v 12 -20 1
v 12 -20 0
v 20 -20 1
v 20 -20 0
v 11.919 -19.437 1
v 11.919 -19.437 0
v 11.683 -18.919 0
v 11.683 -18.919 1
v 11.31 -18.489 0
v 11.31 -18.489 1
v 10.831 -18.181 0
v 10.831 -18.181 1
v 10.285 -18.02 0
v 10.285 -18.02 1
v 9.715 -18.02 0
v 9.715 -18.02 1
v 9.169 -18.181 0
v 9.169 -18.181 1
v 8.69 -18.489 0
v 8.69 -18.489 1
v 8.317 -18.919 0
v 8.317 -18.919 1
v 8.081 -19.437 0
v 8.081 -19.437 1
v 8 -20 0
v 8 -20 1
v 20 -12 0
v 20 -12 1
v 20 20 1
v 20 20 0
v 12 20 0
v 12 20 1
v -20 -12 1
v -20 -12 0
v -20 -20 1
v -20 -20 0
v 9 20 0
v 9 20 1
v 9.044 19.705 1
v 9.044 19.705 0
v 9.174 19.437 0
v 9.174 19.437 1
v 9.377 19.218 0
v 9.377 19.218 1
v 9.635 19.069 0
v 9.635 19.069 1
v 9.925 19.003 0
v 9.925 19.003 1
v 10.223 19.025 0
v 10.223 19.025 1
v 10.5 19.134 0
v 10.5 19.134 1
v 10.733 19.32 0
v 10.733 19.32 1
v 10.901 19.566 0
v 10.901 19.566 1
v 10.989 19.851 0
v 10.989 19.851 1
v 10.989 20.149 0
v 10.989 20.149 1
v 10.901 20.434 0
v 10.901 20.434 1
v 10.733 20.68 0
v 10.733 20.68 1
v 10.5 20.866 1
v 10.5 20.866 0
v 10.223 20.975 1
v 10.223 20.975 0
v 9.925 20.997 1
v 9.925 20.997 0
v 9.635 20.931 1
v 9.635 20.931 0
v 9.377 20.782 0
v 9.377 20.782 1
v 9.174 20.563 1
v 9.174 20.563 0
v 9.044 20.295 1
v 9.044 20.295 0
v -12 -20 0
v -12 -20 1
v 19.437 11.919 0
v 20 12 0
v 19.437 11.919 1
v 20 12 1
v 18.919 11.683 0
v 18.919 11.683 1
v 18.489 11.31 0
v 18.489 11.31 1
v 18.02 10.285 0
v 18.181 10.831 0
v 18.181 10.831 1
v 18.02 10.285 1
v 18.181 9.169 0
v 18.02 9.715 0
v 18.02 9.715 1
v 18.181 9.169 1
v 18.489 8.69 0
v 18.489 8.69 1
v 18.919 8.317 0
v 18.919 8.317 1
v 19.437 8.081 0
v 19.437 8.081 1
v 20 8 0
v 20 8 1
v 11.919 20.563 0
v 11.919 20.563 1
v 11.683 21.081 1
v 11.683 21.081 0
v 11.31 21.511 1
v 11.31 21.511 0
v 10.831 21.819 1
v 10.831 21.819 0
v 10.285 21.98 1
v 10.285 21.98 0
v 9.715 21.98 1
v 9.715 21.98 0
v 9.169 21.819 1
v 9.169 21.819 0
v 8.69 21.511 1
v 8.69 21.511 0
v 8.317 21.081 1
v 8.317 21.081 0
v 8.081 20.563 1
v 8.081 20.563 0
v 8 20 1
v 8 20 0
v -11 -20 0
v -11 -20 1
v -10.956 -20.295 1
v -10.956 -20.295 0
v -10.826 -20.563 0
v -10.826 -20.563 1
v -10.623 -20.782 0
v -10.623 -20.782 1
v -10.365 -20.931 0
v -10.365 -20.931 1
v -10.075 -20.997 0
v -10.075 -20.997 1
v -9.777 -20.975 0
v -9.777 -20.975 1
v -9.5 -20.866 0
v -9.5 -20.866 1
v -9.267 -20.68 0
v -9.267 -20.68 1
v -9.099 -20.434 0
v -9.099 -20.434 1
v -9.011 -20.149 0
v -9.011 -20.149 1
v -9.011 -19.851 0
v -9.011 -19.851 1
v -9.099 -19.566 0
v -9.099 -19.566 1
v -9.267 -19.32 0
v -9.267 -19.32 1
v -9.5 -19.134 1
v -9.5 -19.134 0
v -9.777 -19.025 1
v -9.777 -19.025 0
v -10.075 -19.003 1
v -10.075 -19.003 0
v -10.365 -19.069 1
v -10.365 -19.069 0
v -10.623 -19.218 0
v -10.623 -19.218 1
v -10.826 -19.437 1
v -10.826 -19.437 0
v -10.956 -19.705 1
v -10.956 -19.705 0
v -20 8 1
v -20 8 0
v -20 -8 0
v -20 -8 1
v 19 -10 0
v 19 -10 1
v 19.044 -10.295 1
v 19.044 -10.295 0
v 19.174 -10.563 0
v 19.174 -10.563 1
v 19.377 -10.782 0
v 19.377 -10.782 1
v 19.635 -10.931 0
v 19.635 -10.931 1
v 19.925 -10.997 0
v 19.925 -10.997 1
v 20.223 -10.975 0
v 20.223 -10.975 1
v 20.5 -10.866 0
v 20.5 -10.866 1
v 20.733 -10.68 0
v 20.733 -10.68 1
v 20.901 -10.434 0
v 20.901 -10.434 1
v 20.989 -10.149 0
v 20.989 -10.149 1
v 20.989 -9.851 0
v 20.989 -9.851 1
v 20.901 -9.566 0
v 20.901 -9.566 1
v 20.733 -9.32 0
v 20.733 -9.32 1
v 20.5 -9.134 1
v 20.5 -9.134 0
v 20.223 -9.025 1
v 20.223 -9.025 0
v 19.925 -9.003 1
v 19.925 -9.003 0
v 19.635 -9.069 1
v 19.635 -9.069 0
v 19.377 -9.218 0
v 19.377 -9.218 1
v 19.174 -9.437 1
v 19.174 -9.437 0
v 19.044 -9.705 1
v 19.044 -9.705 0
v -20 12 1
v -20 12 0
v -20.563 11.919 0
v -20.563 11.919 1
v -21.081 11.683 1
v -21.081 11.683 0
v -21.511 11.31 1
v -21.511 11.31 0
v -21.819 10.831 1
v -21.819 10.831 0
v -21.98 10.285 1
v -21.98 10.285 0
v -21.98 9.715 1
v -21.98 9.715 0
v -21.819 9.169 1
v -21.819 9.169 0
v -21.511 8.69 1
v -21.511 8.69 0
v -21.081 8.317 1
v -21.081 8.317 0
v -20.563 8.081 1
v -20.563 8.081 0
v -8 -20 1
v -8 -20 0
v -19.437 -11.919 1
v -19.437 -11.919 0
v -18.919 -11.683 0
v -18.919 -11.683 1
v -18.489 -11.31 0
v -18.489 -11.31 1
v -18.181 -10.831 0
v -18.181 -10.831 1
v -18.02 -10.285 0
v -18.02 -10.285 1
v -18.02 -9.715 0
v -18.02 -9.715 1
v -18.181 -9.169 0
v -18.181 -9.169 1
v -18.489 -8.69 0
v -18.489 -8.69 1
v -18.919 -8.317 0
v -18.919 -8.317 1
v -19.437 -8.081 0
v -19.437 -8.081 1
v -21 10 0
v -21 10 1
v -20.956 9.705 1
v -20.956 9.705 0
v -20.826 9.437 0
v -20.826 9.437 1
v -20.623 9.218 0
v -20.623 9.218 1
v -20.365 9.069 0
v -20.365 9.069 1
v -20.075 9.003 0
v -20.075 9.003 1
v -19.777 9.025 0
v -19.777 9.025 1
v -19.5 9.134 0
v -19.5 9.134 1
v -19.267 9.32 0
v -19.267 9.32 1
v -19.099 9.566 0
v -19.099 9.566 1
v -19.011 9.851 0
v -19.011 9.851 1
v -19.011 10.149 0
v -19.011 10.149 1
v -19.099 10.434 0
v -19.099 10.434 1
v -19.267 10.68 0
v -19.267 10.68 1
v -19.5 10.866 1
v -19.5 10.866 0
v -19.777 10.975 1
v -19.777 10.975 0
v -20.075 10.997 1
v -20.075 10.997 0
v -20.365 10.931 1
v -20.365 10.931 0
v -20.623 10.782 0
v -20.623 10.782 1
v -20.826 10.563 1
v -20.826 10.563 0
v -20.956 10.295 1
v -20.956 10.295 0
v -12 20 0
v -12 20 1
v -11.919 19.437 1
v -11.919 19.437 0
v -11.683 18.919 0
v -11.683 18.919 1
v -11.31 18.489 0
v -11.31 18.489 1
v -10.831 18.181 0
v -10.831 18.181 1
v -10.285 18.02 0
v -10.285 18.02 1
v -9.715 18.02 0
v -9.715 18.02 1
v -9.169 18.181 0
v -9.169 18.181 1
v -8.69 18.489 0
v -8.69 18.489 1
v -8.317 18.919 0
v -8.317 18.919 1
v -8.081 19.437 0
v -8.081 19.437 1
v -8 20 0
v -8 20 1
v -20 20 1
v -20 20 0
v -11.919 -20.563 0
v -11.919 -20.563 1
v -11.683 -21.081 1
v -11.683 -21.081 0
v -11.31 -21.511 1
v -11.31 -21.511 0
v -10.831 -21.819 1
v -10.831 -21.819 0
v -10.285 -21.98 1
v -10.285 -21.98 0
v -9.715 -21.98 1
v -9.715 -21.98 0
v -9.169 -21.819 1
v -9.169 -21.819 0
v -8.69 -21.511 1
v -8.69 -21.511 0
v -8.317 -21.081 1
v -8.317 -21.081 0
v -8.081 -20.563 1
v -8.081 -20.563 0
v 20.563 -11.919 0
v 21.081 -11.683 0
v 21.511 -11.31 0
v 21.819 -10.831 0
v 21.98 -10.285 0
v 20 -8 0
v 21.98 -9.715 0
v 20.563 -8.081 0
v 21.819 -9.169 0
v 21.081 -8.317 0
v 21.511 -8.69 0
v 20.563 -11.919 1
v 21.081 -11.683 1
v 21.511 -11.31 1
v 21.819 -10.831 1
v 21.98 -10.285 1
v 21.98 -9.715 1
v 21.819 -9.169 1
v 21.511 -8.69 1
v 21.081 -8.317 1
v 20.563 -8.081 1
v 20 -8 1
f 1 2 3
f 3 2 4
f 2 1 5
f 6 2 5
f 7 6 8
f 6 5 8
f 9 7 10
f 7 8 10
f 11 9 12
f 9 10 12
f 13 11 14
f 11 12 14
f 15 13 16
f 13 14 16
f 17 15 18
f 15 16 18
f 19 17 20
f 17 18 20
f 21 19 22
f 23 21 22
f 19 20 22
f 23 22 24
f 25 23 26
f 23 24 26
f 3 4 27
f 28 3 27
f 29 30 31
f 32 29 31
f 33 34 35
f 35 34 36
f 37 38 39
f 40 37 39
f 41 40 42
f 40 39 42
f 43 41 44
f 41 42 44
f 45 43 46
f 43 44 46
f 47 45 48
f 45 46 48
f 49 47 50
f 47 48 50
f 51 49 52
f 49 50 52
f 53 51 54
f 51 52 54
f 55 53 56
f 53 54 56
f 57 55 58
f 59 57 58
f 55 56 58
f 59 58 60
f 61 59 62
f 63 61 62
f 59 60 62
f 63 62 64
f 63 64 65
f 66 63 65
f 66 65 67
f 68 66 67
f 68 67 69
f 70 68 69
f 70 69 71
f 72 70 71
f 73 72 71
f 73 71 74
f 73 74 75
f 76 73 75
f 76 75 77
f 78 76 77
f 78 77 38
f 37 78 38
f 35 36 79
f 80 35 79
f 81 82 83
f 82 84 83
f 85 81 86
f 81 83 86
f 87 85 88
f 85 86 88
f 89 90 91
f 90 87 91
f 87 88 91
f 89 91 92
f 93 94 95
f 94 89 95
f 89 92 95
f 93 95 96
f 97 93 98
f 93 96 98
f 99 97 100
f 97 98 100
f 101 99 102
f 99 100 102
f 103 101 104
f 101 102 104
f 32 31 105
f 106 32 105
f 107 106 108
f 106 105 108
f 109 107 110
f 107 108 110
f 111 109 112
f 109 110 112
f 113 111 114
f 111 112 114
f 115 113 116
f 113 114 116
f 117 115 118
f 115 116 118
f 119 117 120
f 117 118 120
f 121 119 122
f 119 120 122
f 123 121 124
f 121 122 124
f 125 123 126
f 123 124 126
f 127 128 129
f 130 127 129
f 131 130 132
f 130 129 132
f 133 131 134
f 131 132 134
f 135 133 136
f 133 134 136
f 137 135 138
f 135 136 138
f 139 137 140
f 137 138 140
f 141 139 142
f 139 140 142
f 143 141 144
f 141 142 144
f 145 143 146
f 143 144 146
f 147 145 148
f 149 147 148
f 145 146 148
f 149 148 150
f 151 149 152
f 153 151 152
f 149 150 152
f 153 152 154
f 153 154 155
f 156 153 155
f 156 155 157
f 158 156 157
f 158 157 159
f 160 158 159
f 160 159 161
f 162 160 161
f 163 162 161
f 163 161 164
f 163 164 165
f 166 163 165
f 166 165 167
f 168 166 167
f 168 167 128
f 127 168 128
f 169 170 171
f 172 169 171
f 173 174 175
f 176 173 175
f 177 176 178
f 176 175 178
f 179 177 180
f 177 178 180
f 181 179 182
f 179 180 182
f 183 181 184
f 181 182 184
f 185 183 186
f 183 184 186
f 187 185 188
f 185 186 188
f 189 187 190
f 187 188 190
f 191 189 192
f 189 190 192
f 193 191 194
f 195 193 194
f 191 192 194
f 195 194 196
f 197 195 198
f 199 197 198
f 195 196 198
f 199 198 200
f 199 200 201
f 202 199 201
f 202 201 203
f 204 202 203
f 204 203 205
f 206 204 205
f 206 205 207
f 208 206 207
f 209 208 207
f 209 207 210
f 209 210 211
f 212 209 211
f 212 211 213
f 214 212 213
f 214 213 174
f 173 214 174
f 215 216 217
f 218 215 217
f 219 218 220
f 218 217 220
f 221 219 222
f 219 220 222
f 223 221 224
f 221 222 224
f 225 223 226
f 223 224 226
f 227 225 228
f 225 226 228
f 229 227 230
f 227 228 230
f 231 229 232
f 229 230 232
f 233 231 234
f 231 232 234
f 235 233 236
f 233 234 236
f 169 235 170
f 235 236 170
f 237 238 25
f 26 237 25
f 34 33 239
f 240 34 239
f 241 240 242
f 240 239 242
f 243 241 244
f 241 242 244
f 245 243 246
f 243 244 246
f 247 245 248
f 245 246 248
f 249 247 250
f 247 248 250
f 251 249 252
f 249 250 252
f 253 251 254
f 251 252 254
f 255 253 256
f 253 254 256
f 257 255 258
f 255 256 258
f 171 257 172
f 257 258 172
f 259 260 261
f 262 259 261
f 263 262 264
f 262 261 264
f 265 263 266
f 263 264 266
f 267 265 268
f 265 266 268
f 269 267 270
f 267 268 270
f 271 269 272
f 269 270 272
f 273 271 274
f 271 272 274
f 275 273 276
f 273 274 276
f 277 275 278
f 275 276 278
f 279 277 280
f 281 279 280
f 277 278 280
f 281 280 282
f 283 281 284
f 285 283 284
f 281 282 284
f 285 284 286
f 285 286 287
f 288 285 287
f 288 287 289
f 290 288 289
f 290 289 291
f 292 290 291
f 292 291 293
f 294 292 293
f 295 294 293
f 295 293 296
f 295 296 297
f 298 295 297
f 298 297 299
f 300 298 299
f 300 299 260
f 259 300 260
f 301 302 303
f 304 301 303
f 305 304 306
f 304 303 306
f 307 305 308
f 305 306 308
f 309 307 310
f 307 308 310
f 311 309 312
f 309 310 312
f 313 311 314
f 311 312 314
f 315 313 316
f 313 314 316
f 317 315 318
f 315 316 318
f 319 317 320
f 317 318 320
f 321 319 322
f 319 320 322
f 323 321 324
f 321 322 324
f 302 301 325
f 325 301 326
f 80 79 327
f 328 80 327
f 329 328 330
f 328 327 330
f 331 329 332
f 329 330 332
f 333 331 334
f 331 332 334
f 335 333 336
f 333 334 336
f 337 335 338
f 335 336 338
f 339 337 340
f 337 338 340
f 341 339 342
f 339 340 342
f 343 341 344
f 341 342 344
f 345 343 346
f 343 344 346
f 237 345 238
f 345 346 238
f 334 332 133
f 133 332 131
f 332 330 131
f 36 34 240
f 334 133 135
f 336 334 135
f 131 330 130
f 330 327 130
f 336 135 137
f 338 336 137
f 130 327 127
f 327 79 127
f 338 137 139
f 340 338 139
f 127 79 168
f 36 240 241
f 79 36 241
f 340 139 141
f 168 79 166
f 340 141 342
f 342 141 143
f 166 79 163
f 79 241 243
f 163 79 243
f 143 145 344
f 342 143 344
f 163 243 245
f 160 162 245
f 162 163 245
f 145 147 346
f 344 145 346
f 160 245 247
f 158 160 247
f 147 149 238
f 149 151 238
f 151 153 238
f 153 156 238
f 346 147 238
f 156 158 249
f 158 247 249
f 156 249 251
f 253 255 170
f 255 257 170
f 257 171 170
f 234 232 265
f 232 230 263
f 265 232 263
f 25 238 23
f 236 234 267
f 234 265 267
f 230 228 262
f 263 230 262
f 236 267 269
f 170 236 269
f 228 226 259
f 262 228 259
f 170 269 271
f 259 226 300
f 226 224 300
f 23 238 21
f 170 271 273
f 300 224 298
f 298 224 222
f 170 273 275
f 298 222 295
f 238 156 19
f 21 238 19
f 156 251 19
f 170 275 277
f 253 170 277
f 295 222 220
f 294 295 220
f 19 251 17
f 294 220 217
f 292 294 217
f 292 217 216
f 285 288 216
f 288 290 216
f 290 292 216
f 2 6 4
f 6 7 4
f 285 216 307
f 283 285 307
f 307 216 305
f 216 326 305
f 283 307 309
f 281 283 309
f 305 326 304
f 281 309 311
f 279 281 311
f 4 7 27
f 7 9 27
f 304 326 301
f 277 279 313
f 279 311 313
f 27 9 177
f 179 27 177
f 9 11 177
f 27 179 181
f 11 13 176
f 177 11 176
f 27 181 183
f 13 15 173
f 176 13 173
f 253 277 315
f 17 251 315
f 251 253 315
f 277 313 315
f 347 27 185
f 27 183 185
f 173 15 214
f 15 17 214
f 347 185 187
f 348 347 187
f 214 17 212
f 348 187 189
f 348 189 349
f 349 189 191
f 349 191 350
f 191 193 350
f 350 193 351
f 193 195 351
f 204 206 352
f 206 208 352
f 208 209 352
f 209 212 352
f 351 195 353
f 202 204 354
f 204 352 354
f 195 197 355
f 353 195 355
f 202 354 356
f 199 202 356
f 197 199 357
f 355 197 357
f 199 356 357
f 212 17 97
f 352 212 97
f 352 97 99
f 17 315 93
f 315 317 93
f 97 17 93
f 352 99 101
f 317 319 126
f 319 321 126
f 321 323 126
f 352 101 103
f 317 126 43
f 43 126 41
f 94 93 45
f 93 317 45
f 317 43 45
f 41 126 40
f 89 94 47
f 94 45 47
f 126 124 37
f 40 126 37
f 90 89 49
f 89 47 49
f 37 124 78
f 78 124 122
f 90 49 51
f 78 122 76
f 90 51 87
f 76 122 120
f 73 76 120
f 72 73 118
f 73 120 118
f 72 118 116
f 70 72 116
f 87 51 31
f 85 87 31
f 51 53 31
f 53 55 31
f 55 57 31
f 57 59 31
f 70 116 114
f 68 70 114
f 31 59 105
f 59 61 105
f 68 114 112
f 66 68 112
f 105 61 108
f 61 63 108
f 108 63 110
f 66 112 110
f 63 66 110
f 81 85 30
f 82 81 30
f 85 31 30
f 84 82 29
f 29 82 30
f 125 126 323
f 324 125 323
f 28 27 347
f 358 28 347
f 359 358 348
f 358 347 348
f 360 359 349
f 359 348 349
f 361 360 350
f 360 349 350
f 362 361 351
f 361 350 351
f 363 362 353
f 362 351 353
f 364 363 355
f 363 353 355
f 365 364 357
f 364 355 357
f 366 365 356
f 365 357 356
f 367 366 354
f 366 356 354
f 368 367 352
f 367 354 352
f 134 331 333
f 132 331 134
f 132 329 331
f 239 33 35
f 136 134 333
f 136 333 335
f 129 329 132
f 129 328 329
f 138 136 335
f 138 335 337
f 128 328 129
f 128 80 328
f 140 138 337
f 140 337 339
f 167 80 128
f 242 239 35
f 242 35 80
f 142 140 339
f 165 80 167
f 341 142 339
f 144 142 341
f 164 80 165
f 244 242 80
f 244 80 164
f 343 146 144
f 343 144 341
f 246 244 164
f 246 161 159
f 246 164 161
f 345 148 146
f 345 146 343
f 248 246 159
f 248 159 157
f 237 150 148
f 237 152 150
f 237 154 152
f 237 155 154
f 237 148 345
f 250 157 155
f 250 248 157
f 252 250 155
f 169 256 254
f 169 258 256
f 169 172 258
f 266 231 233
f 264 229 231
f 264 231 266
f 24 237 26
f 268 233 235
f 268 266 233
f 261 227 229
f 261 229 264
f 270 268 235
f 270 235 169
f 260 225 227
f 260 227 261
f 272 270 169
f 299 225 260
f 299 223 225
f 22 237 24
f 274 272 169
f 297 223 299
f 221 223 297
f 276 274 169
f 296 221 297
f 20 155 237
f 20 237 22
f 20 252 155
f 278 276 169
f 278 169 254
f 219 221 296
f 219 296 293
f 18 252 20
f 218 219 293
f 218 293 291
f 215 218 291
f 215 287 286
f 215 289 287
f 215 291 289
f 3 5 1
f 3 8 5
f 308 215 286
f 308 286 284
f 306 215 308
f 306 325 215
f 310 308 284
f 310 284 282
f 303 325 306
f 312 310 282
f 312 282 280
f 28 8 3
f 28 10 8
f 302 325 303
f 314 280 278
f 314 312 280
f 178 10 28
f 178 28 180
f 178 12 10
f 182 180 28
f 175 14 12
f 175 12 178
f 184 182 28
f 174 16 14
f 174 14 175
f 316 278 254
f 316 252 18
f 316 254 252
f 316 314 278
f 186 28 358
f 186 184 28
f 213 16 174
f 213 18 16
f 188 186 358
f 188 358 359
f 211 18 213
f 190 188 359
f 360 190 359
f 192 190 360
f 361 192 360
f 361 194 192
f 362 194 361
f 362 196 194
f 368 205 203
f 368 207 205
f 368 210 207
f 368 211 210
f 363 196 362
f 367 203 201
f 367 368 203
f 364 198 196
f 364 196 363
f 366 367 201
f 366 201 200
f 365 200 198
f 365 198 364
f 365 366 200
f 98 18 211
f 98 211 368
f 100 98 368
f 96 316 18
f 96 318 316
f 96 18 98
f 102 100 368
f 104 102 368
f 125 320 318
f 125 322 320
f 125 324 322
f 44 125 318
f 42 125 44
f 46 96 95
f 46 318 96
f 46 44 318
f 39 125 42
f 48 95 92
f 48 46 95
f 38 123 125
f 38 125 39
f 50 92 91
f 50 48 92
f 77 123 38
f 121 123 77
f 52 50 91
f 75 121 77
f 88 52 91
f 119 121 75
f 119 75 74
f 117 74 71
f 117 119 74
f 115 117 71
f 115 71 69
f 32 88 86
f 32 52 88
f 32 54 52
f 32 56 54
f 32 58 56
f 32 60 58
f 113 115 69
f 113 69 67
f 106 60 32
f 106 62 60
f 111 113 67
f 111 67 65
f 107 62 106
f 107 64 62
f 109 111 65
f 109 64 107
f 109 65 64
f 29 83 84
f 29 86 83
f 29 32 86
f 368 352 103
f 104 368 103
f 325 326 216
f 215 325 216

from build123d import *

# Parameters (mm, degrees)
F1_DEPTH = 1
F2_D     = 4
F3_D     = 2


with BuildPart() as f1:
    # F0 (on Top) → F1 (new body)
    with BuildSketch(Plane.XY):
        with BuildLine():
            Line((20, 12), (20, 20))
            Line((20, 20), (12, 20))
            Line((12, 20), (8, 20))
            Line((8, 20), (-8, 20))
            ThreePointArc((-8, 20), (-10, 18), (-12, 20))
            Line((-12, 20), (-20, 20))
            Line((-20, 20), (-20, 12))
            Line((-20, 12), (-20, 8))
            Line((-20, 8), (-20, -8))
            ThreePointArc((-20, -8), (-18.5857864376, -8.5857864376), (-18, -10))
            ThreePointArc((-18, -10), (-18.5857864376, -11.4142135624), (-20, -12))
            Line((-20, -12), (-20, -20))
            Line((-20, -20), (-12, -20))
            Line((-12, -20), (-8, -20))
            Line((-8, -20), (8, -20))
            ThreePointArc((8, -20), (10, -18), (12, -20))
            Line((12, -20), (20, -20))
            Line((20, -20), (20, -12))
            Line((20, -12), (20, -8))
            Line((20, -8), (20, 8))
            ThreePointArc((20, 8), (18, 10), (20, 12))
        make_face()
        with BuildLine():
            Line((8, 20), (12, 20))
            ThreePointArc((12, 20), (10, 22), (8, 20))
        make_face()
        with BuildLine():
            ThreePointArc((22, 10), (21.4142135624, 11.4142135624), (20, 12))
            Line((20, 12), (20, 8))
            ThreePointArc((20, 8), (21.4142135624, 8.5857864376), (22, 10))
        make_face()
        with BuildLine():
            Line((20, 8), (20, 12))
            ThreePointArc((20, 12), (18, 10), (20, 8))
        make_face()
        with BuildLine():
            ThreePointArc((-12, 20), (-10, 18), (-8, 20))
            Line((-8, 20), (-12, 20))
        make_face()
        with BuildLine():
            Line((-12, 20), (-8, 20))
            ThreePointArc((-8, 20), (-10, 22), (-12, 20))
        make_face()
        with BuildLine():
            ThreePointArc((20, -12), (22, -10), (20, -8))
            Line((20, -8), (20, -12))
        make_face()
        with BuildLine():
            Line((-20, 8), (-20, 12))
            ThreePointArc((-20, 12), (-22, 10), (-20, 8))
        make_face()
        with BuildLine():
            ThreePointArc((8, -20), (10, -22), (12, -20))
            Line((12, -20), (8, -20))
        make_face()
        with BuildLine():
            Line((8, -20), (12, -20))
            ThreePointArc((12, -20), (10, -18), (8, -20))
        make_face()
        with BuildLine():
            ThreePointArc((-18, -10), (-18.5857864376, -8.5857864376), (-20, -8))
            Line((-20, -8), (-20, -12))
            ThreePointArc((-20, -12), (-18.5857864376, -11.4142135624), (-18, -10))
        make_face()
        with BuildLine():
            Line((-20, -12), (-20, -8))
            ThreePointArc((-20, -8), (-22, -10), (-20, -12))
        make_face()
        with BuildLine():
            ThreePointArc((-12, -20), (-10, -22), (-8, -20))
            Line((-8, -20), (-12, -20))
        make_face()
    extrude(amount=F1_DEPTH)

    # F2 (through all)
    with Locations(Plane(origin=(0, 0, 0), x_dir=(1, 0, 0), z_dir=(0, 0, -1))):
        with Locations((-20, 10), (-10, -20), (20, -10), (10, 20)):
            Hole(F2_D / 2)

    # F3 (through all)
    with Locations(Plane(origin=(0, 0, 0), x_dir=(1, 0, 0), z_dir=(0, 0, -1))):
        with Locations((10, -20), (-20, -10), (-10, 20), (20, 10)):
            Hole(F3_D / 2)


solid = f1.part
